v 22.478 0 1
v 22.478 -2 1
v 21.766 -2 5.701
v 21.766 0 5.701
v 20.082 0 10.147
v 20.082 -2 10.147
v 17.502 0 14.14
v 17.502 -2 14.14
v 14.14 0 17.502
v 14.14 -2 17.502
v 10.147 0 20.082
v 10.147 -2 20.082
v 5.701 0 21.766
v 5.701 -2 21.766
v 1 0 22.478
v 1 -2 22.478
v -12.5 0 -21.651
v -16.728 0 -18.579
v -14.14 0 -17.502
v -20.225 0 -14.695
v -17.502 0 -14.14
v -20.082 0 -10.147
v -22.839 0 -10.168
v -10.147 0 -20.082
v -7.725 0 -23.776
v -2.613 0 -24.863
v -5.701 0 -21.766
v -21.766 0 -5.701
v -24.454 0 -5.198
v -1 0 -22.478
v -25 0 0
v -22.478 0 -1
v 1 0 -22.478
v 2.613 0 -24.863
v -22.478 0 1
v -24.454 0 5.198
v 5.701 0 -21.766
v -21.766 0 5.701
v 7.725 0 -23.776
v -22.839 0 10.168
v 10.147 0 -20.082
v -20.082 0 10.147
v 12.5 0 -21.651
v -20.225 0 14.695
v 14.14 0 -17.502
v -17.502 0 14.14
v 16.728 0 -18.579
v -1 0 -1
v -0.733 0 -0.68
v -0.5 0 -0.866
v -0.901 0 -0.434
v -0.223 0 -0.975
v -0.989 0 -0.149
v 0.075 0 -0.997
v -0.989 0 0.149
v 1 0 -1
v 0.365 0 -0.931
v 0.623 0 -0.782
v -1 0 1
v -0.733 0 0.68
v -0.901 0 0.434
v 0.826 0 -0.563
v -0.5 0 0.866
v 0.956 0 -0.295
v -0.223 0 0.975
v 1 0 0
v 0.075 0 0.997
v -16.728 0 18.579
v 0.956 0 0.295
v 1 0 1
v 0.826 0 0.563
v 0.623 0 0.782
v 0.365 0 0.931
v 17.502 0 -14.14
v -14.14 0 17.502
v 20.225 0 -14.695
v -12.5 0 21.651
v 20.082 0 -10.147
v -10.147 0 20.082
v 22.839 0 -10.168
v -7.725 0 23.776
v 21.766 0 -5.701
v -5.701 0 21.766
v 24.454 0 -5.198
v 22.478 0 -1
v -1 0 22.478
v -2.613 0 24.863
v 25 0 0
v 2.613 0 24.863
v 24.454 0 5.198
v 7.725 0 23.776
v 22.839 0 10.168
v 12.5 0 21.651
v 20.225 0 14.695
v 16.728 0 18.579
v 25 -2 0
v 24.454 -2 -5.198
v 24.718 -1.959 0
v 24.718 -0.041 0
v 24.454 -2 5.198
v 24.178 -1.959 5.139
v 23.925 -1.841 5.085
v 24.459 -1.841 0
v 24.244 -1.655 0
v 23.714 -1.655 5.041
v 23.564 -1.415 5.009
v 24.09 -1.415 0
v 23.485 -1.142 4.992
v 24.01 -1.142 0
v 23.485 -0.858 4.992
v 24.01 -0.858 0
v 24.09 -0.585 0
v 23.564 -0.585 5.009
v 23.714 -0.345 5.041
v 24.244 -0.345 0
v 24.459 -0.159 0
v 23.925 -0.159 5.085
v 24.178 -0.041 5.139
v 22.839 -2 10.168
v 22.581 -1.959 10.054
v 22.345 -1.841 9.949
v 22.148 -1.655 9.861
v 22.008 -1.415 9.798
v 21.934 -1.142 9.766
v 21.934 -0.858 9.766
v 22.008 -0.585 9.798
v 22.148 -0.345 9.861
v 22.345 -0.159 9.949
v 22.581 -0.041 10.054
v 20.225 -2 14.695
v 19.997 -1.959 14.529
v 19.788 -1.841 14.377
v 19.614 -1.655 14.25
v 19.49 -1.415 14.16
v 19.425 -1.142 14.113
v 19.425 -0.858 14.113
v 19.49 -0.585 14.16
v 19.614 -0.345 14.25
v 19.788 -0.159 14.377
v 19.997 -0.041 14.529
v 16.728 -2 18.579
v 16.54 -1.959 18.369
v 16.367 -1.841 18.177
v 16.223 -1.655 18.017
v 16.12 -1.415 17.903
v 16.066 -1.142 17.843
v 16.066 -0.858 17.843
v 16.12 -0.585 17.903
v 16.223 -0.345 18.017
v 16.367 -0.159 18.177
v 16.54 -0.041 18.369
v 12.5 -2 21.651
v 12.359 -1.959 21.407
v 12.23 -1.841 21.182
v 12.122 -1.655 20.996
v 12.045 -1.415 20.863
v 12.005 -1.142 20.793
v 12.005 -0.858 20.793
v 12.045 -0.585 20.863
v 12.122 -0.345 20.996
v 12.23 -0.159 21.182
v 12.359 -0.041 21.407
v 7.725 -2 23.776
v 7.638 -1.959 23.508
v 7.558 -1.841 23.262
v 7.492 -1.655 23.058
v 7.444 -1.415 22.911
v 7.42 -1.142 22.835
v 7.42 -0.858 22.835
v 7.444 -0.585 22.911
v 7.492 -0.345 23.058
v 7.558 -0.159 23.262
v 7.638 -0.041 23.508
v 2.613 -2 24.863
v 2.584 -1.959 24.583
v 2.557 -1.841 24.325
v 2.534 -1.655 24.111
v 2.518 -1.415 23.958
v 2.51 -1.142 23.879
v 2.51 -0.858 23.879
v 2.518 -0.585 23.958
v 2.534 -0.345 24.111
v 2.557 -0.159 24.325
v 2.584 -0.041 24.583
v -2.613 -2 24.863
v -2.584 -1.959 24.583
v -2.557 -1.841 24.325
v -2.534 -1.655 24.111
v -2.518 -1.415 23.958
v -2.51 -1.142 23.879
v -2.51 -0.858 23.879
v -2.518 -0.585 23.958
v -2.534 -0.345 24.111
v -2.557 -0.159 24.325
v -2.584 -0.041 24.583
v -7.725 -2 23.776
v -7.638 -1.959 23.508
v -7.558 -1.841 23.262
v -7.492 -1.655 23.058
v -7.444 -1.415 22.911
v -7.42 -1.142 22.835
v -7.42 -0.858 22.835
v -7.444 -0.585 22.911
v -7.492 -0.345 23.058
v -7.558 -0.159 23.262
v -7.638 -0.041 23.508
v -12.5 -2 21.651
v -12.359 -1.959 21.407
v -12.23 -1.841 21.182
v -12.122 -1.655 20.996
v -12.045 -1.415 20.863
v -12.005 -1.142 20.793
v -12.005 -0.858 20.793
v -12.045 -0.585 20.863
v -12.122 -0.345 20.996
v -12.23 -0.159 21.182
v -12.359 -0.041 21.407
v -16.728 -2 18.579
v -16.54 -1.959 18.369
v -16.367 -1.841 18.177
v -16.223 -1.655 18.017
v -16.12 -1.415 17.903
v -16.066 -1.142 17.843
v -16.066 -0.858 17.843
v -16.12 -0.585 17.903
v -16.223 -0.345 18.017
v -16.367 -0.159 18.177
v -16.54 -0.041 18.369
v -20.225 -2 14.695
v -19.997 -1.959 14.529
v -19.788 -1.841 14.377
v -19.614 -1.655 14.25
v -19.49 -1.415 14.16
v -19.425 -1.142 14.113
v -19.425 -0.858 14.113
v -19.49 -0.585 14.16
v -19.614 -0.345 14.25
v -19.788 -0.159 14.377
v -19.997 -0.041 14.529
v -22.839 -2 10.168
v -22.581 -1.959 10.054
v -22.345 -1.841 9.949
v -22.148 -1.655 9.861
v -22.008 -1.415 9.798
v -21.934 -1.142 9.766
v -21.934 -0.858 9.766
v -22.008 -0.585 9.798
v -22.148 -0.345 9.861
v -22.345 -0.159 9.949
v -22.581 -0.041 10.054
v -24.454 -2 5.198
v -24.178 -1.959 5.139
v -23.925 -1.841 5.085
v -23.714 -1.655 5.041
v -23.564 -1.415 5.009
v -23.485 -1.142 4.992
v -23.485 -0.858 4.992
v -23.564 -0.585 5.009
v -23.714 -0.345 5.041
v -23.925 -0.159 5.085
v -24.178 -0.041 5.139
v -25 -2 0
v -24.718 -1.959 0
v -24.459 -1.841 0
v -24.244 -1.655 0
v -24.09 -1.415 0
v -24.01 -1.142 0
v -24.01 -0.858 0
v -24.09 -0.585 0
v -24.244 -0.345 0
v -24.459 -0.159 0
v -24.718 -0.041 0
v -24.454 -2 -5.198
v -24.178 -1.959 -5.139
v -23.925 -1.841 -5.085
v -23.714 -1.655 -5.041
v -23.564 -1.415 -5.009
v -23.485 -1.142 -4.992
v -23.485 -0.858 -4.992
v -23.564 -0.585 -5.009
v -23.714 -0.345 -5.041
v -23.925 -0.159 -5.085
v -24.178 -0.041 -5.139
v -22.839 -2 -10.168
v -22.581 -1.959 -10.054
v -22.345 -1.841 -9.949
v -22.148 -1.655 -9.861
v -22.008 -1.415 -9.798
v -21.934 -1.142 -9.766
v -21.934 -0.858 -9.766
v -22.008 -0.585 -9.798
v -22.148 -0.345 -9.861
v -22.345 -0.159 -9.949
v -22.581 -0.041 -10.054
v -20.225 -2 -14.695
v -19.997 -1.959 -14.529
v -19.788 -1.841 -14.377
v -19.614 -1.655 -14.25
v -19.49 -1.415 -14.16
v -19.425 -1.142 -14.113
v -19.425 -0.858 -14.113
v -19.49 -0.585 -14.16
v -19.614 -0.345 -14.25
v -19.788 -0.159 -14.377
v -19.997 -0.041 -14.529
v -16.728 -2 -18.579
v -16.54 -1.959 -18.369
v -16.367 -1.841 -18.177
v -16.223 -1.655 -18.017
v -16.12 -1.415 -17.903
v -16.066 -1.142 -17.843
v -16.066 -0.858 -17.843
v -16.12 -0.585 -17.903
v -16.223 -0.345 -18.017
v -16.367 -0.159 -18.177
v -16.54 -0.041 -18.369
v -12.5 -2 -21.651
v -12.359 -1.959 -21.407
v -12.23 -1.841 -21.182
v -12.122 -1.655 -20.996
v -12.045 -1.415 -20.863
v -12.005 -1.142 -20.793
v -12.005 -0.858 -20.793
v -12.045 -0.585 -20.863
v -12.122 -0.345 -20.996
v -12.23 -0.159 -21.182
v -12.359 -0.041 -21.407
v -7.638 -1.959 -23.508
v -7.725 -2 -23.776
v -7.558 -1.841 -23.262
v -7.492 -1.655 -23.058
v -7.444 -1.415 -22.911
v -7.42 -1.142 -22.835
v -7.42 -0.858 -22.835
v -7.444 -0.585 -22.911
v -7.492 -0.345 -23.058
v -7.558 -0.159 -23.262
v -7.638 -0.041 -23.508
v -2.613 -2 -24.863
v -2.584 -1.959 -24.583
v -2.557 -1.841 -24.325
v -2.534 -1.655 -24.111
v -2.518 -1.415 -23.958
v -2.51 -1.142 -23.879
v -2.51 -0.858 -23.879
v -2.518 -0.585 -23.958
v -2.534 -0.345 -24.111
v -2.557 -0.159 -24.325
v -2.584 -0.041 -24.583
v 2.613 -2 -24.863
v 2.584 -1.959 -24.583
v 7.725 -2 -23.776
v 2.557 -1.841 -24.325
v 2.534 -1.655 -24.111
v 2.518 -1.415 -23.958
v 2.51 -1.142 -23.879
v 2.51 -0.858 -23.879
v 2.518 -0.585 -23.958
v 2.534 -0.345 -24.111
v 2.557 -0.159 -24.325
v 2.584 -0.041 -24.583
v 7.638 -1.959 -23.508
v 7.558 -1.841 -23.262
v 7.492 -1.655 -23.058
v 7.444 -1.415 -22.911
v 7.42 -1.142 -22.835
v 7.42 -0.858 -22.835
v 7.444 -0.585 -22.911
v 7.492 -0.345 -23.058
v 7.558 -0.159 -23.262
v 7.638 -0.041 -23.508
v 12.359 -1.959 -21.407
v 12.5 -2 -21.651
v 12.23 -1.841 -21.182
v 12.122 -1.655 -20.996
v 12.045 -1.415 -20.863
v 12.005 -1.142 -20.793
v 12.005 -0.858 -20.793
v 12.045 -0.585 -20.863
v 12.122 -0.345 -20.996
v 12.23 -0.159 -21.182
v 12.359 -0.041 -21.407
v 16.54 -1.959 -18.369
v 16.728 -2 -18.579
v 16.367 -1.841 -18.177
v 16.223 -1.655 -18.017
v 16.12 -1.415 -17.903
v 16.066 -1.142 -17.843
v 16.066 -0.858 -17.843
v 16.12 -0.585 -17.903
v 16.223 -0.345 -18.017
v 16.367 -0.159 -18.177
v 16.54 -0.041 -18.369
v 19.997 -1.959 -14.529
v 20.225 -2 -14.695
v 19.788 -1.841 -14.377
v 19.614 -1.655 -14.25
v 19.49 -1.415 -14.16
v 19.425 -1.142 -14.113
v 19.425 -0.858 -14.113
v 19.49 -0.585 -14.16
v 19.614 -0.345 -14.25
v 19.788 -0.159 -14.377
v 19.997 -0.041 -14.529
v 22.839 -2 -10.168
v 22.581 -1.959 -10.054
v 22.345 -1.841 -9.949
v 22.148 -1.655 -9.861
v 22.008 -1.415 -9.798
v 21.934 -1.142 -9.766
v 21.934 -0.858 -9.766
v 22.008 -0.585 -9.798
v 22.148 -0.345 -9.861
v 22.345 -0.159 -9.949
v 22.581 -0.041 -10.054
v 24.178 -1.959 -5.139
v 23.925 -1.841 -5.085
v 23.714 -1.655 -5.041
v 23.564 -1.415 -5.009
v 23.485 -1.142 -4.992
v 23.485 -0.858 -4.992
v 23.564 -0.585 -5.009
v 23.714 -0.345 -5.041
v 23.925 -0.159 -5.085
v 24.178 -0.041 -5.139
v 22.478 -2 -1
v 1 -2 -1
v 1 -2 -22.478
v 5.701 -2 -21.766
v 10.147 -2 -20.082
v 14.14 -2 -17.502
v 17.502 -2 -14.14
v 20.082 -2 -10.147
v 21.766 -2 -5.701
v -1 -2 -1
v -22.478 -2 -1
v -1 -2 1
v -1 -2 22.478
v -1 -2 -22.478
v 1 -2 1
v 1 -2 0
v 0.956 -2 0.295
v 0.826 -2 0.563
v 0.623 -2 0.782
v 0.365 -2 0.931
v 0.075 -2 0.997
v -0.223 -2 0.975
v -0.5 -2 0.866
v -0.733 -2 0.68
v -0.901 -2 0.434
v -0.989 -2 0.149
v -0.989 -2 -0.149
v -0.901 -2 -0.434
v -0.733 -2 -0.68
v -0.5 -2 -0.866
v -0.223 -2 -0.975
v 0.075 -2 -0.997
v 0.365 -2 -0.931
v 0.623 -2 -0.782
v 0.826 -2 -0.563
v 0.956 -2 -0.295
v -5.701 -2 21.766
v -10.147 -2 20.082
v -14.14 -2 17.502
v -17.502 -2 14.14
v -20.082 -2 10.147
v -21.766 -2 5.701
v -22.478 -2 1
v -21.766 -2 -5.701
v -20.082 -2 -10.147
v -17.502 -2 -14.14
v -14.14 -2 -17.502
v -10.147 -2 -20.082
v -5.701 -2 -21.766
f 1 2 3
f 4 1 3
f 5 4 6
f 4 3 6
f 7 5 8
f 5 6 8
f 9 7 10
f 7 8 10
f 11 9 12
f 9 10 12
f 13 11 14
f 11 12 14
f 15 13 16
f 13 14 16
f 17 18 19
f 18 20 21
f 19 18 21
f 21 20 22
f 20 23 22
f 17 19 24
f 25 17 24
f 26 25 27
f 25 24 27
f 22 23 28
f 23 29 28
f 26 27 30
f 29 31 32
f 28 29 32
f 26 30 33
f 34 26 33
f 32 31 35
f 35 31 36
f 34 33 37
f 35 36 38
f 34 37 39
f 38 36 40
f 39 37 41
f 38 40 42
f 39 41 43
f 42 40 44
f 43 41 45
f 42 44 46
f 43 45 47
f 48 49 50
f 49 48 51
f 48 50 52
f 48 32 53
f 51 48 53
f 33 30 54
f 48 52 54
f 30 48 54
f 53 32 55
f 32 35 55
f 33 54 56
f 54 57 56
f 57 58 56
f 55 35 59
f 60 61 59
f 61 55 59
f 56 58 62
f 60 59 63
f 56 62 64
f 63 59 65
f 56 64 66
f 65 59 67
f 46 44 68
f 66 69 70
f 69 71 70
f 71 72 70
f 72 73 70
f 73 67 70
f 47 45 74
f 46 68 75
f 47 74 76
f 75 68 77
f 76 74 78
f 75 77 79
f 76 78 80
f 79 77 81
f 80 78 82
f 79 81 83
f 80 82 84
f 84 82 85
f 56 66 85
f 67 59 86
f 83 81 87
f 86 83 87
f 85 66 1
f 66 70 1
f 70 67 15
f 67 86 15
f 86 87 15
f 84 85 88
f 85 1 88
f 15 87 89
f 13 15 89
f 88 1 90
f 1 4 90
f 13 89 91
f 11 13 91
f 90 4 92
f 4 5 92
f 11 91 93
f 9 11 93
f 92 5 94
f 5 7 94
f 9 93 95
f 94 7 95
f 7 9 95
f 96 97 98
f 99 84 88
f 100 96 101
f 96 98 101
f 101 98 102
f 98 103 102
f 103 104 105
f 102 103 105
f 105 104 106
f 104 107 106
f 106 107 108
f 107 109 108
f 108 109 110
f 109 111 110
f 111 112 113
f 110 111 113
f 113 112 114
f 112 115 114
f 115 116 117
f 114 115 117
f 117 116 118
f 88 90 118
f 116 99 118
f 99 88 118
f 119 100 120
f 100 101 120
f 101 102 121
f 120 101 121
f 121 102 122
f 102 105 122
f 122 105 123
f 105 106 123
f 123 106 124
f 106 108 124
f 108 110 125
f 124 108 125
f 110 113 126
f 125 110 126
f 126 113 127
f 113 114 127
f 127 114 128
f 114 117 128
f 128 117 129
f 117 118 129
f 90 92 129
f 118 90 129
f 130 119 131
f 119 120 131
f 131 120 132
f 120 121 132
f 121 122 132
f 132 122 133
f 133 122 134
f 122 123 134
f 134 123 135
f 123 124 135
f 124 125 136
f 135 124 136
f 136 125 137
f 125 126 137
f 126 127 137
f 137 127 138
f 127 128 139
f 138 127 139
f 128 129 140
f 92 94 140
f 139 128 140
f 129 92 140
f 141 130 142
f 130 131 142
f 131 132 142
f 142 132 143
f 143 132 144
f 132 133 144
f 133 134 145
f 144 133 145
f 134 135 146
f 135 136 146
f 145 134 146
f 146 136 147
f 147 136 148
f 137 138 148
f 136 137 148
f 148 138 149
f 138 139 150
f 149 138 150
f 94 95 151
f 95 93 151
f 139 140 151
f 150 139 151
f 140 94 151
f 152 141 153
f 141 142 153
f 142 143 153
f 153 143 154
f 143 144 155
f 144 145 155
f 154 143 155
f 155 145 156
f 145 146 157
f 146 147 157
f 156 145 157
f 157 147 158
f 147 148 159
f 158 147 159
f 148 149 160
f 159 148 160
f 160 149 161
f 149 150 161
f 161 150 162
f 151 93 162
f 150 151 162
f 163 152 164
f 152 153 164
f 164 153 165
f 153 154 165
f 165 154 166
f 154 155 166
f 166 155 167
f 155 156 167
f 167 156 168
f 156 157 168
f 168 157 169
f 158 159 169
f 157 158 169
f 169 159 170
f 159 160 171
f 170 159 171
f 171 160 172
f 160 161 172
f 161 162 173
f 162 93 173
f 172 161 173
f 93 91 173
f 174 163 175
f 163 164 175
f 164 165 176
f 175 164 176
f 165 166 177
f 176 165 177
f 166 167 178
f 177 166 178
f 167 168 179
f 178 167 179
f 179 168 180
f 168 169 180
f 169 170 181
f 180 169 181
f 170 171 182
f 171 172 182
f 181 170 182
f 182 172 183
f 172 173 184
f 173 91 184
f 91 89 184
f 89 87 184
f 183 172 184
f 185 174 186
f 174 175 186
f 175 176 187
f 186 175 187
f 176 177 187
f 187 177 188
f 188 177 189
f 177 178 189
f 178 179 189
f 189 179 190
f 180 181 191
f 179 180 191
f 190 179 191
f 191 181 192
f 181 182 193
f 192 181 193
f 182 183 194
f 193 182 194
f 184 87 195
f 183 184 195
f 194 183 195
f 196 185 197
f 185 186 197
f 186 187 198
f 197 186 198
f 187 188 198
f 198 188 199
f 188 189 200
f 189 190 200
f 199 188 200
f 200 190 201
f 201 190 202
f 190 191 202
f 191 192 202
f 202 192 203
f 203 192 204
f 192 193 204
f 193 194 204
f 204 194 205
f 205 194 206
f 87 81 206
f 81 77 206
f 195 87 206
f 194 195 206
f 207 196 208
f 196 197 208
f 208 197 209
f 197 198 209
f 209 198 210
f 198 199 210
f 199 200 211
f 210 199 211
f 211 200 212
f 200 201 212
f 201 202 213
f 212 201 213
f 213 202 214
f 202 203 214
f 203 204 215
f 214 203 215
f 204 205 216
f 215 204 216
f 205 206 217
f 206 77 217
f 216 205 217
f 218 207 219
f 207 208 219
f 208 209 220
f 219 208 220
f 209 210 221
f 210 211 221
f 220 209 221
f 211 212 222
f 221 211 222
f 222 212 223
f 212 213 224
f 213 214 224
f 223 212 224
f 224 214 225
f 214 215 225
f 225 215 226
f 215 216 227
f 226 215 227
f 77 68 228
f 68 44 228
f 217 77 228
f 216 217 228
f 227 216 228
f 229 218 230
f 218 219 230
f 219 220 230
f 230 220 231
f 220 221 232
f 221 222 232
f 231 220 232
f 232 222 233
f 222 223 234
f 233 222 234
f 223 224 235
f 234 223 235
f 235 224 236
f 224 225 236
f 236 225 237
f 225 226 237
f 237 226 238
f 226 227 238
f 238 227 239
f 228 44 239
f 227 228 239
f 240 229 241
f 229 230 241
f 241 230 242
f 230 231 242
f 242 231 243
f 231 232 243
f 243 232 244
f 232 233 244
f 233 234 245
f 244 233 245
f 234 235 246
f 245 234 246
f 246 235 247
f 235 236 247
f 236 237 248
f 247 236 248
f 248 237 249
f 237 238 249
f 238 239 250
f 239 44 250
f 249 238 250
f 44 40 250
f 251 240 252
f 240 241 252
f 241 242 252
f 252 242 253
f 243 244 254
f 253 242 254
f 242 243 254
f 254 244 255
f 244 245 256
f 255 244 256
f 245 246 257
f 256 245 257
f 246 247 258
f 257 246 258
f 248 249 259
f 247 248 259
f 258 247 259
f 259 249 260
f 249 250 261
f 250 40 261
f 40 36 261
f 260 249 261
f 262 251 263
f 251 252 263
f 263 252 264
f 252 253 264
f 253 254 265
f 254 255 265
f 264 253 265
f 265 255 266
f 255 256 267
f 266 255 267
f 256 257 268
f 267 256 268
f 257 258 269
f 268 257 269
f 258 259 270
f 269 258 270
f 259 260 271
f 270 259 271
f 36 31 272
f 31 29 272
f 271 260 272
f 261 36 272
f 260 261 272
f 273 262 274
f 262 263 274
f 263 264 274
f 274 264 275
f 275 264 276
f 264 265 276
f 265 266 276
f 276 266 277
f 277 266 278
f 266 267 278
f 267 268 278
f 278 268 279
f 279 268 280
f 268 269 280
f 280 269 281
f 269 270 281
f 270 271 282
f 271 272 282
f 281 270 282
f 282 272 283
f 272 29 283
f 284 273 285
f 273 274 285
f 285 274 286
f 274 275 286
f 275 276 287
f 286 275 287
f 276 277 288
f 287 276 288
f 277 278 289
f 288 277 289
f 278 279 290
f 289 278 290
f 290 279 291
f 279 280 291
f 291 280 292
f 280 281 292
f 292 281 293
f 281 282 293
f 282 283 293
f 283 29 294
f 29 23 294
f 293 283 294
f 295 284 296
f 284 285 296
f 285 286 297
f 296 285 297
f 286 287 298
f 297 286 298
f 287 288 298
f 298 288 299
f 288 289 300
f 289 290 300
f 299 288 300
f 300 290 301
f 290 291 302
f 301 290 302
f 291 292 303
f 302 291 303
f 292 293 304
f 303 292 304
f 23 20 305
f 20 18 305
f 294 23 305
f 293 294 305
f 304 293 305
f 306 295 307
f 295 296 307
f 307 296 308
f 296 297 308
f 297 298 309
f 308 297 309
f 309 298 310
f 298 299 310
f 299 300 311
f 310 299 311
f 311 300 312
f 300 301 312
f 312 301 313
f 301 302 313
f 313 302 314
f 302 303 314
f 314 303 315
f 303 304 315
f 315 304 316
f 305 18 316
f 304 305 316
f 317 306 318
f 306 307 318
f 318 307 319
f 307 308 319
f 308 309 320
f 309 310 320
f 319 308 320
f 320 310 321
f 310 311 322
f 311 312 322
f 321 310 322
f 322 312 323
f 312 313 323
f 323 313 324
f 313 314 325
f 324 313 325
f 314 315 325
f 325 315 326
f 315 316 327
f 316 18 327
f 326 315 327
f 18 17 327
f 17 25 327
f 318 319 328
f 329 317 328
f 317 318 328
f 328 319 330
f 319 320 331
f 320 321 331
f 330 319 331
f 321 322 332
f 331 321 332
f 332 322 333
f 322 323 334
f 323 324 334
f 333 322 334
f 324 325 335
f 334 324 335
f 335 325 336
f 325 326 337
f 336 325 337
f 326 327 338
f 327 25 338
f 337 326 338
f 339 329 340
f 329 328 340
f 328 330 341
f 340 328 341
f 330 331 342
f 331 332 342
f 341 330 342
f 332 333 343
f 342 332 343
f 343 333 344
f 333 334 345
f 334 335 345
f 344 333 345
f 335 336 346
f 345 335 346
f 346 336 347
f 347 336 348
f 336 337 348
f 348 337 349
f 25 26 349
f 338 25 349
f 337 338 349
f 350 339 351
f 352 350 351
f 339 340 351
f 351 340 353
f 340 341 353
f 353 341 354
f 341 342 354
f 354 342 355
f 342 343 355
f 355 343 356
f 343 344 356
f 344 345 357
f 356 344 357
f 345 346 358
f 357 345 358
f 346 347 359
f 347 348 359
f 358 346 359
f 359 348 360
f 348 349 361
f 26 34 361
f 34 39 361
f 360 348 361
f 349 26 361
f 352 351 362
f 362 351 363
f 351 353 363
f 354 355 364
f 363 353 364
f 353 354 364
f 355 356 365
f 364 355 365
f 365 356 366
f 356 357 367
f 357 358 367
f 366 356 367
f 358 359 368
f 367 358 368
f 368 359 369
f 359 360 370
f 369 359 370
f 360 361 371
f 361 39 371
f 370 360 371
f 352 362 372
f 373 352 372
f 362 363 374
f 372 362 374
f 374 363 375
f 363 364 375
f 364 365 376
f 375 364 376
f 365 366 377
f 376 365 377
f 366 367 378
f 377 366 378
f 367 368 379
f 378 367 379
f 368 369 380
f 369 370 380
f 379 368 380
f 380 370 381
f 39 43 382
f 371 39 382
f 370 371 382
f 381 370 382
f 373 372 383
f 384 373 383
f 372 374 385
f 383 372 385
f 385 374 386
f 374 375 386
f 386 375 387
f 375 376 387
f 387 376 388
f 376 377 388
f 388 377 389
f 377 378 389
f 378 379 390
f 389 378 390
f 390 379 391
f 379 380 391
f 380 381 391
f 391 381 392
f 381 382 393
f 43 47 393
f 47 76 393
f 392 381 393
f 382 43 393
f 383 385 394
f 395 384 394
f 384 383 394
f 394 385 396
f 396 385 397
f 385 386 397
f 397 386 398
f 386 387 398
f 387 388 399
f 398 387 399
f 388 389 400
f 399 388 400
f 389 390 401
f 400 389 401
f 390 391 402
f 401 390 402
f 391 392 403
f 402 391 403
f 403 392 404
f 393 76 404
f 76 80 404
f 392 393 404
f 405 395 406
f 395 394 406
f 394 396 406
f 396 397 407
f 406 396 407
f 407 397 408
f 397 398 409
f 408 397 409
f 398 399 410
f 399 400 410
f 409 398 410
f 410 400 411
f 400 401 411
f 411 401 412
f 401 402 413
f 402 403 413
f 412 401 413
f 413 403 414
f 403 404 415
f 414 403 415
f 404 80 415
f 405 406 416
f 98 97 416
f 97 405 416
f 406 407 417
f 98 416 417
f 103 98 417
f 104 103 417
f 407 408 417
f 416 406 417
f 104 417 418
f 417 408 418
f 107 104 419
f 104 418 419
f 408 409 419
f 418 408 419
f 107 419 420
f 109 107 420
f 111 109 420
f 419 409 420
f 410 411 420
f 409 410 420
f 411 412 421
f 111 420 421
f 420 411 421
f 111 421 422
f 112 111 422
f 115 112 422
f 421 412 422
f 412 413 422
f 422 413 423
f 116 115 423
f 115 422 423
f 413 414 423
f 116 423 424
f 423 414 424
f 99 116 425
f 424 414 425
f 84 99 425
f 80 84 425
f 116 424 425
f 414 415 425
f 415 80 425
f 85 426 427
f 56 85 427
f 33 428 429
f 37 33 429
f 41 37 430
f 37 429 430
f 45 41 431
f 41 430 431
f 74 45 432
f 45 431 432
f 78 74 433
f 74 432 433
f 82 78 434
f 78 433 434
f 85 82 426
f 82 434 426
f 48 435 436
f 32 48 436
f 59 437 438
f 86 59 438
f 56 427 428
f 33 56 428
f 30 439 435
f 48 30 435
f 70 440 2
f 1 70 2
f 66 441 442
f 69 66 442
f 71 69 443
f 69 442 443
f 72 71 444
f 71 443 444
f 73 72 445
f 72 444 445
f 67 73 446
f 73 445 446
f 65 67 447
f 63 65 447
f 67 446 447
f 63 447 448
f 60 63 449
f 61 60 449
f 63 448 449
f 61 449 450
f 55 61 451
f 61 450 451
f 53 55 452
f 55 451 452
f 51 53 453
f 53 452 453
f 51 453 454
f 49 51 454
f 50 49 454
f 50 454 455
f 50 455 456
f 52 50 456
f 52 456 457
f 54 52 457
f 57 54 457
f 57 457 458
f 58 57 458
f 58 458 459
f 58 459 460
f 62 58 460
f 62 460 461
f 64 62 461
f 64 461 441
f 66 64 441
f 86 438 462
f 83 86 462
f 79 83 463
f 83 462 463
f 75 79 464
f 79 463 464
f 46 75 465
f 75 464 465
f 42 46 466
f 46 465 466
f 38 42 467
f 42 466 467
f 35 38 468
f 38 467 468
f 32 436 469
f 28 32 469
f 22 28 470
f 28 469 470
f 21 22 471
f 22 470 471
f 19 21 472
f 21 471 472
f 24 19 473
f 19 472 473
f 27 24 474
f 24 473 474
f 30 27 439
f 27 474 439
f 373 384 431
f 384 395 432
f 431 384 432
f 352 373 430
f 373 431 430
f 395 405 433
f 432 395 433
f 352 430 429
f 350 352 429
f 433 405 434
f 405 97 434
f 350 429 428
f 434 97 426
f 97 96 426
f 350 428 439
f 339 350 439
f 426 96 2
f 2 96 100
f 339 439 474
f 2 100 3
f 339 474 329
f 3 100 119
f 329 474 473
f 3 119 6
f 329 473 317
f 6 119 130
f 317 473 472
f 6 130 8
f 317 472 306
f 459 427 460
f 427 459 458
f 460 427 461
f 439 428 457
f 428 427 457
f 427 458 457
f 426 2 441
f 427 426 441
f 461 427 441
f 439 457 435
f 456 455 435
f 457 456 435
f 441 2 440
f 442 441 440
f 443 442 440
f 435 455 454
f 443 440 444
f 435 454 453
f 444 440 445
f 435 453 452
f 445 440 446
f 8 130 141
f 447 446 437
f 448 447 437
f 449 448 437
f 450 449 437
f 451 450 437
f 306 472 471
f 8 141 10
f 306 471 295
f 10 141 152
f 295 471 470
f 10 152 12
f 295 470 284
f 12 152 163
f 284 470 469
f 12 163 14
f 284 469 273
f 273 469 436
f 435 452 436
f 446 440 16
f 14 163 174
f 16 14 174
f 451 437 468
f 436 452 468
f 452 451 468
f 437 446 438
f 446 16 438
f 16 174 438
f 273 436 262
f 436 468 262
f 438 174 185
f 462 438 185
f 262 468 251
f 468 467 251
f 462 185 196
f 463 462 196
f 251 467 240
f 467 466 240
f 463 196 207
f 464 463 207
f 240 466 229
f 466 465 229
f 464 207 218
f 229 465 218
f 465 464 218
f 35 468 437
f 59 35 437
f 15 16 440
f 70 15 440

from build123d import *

# Parameters (mm, degrees)
F2_R     = 1
F3_DEPTH = 25
F5_DEPTH = 25


with BuildPart() as f1:
    # F0 (on Top) → F1 (revolve)
    with BuildSketch(Plane.XY):
        with BuildLine():
            Line((25, 0), (0, 0))
            Line((0, 0), (0, -2))
            Line((0, -2), (25, -2))
            ThreePointArc((25, -2), (24, -1), (25, 0))
        make_face()
    revolve(axis=Axis((0, -1, 0), (0, -1, 0)))

    # F2 (on face) → F3 (cut)
    with BuildSketch(Plane.XZ.offset(2)):
        Circle(F2_R)
    extrude(amount=-F3_DEPTH, mode=Mode.SUBTRACT)

    # F4 (on face) → F5 (cut)
    with BuildSketch(Plane.XZ.offset(2)):
        with BuildLine():
            Line((-1, 1), (-1, 22.477766793))
            ThreePointArc((-1, 22.477766793), (-15.9099025767, 15.9099025767), (-22.477766793, 1))
            Line((-22.477766793, 1), (-1, 1))
        make_face()
        with BuildLine():
            ThreePointArc((-22.477766793, -1), (-15.9099025767, -15.9099025767), (-1, -22.477766793))
            Line((-1, -22.477766793), (-1, -1))
            Line((-1, -1), (-22.477766793, -1))
        make_face()
        with BuildLine():
            ThreePointArc((1, -22.477766793), (15.9099025767, -15.9099025767), (22.477766793, -1))
            Line((22.477766793, -1), (1, -1))
            Line((1, -1), (1, -22.477766793))
        make_face()
        with BuildLine():
            Line((1, 1), (22.477766793, 1))
            ThreePointArc((22.477766793, 1), (15.9099025767, 15.9099025767), (1, 22.477766793))
            Line((1, 22.477766793), (1, 1))
        make_face()
    extrude(amount=-F5_DEPTH, mode=Mode.SUBTRACT)


solid = f1.part
